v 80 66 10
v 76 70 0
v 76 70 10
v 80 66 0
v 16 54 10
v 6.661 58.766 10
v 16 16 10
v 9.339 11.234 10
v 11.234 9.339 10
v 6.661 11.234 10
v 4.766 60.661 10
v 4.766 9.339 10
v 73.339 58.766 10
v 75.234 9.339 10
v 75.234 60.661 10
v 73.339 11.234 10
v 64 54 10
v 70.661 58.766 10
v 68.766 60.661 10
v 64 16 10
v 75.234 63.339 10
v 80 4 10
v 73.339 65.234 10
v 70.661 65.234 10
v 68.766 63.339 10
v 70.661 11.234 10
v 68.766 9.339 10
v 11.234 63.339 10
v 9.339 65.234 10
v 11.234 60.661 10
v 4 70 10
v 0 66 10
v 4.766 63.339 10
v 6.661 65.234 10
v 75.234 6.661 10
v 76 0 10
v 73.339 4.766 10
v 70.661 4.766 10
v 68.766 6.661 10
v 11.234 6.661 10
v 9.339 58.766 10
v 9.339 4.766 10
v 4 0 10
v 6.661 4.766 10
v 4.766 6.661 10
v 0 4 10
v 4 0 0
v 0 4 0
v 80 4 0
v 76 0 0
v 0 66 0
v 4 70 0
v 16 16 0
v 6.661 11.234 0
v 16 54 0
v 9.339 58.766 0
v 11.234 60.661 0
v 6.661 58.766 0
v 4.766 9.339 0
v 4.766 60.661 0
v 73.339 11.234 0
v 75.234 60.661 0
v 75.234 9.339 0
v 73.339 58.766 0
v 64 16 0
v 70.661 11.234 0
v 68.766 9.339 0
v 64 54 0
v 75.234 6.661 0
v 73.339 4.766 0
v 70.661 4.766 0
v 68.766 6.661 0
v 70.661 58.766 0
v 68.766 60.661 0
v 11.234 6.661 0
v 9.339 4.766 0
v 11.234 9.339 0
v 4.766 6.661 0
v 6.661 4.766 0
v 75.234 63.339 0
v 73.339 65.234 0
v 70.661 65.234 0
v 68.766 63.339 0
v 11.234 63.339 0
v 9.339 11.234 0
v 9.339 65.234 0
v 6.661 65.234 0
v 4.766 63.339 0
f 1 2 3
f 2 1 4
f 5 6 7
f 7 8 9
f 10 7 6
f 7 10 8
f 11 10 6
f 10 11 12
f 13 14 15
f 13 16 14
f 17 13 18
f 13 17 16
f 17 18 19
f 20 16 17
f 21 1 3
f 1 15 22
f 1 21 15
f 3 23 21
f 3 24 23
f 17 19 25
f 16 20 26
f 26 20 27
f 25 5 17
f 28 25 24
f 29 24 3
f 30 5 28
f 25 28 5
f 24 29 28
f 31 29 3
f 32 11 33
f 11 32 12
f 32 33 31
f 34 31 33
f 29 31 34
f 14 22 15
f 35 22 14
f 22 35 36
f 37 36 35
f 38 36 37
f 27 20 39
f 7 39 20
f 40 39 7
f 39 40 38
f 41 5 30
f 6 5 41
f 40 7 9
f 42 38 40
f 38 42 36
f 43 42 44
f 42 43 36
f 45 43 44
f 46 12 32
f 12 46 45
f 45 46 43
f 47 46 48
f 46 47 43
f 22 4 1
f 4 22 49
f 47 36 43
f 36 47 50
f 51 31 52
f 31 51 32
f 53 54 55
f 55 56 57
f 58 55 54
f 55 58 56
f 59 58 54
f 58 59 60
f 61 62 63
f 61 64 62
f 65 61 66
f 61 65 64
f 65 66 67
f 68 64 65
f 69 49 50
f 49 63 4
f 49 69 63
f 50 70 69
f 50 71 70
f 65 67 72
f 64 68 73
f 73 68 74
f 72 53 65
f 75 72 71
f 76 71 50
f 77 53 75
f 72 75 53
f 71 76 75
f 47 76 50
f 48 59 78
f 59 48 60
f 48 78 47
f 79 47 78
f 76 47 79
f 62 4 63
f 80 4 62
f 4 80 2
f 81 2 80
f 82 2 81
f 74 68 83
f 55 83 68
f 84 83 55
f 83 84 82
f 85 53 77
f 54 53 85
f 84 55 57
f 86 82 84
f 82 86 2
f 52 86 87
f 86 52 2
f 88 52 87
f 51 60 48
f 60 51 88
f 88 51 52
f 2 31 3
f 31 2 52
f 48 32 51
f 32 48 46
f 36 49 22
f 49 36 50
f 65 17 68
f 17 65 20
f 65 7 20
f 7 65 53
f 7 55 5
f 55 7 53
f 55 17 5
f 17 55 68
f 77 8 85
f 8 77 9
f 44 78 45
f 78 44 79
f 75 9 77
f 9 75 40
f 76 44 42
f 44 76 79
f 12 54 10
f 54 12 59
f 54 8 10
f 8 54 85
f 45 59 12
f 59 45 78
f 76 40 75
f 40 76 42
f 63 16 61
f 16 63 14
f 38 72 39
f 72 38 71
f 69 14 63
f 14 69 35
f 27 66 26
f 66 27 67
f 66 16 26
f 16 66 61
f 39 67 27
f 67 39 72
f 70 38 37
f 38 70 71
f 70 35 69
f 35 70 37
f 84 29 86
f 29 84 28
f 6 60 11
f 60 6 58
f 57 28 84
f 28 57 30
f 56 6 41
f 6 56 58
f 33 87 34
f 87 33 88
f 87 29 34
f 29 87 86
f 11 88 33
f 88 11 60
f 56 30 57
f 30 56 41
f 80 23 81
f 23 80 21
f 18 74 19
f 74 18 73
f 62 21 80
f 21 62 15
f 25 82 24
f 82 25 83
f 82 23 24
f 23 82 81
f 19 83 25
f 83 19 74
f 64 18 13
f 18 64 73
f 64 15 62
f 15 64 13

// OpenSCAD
$fn = 32;

// ----------------------------------------------------------------------
// Frame plate: 80 x 70 frame, 16 mm rails
// ----------------------------------------------------------------------

// --- parameters (mm) ---
plate_l = 80;             // plate length, X
plate_w = 70;             // plate width, Y
plate_t = 10;             // plate thickness, Z (extrusion height)
corner_c = 4;             // corner chamfer
frame_bar = 16;           // frame rail width
bolt_r = 3.5;             // corner bolt window radius
bolt_inset = 8;           // bolt centre inset from the edges

win_l = plate_l - 2 * frame_bar;  // window length
win_w = plate_w - 2 * frame_bar;  // window width
bolt_d = 2 * bolt_r;  // corner hole diameter

profile = [[4, 0], [76, 0], [80, 4], [80, 66], [76, 70], [4, 70], [0, 66], [0, 4]];  // primary outline, 8 points, counter clockwise
void_1 = [[16, 16], [64, 16], [64, 54], [16, 54]];  // the window, 4 points
void_2 = [[11.234, 9.339], [9.339, 11.234], [6.661, 11.234], [4.766, 9.339], [4.766, 6.661], [6.661, 4.766], [9.339, 4.766], [11.234, 6.661]];  // corner bolt window, 8 points
void_3 = [[75.234, 9.339], [73.339, 11.234], [70.661, 11.234], [68.766, 9.339], [68.766, 6.661], [70.661, 4.766], [73.339, 4.766], [75.234, 6.661]];  // corner bolt window, 8 points
void_4 = [[11.234, 63.339], [9.339, 65.234], [6.661, 65.234], [4.766, 63.339], [4.766, 60.661], [6.661, 58.766], [9.339, 58.766], [11.234, 60.661]];  // corner bolt window, 8 points
void_5 = [[75.234, 63.339], [73.339, 65.234], [70.661, 65.234], [68.766, 63.339], [68.766, 60.661], [70.661, 58.766], [73.339, 58.766], [75.234, 60.661]];  // corner bolt window, 8 points

// --- the one profile operation ---
difference() {
  linear_extrude(height = plate_t) polygon(points = profile);
  translate([0, 0, -1])
    linear_extrude(height = plate_t + 2) polygon(points = void_1);
  translate([0, 0, -1])
    linear_extrude(height = plate_t + 2) polygon(points = void_2);
  translate([0, 0, -1])
    linear_extrude(height = plate_t + 2) polygon(points = void_3);
  translate([0, 0, -1])
    linear_extrude(height = plate_t + 2) polygon(points = void_4);
  translate([0, 0, -1])
    linear_extrude(height = plate_t + 2) polygon(points = void_5);
}
